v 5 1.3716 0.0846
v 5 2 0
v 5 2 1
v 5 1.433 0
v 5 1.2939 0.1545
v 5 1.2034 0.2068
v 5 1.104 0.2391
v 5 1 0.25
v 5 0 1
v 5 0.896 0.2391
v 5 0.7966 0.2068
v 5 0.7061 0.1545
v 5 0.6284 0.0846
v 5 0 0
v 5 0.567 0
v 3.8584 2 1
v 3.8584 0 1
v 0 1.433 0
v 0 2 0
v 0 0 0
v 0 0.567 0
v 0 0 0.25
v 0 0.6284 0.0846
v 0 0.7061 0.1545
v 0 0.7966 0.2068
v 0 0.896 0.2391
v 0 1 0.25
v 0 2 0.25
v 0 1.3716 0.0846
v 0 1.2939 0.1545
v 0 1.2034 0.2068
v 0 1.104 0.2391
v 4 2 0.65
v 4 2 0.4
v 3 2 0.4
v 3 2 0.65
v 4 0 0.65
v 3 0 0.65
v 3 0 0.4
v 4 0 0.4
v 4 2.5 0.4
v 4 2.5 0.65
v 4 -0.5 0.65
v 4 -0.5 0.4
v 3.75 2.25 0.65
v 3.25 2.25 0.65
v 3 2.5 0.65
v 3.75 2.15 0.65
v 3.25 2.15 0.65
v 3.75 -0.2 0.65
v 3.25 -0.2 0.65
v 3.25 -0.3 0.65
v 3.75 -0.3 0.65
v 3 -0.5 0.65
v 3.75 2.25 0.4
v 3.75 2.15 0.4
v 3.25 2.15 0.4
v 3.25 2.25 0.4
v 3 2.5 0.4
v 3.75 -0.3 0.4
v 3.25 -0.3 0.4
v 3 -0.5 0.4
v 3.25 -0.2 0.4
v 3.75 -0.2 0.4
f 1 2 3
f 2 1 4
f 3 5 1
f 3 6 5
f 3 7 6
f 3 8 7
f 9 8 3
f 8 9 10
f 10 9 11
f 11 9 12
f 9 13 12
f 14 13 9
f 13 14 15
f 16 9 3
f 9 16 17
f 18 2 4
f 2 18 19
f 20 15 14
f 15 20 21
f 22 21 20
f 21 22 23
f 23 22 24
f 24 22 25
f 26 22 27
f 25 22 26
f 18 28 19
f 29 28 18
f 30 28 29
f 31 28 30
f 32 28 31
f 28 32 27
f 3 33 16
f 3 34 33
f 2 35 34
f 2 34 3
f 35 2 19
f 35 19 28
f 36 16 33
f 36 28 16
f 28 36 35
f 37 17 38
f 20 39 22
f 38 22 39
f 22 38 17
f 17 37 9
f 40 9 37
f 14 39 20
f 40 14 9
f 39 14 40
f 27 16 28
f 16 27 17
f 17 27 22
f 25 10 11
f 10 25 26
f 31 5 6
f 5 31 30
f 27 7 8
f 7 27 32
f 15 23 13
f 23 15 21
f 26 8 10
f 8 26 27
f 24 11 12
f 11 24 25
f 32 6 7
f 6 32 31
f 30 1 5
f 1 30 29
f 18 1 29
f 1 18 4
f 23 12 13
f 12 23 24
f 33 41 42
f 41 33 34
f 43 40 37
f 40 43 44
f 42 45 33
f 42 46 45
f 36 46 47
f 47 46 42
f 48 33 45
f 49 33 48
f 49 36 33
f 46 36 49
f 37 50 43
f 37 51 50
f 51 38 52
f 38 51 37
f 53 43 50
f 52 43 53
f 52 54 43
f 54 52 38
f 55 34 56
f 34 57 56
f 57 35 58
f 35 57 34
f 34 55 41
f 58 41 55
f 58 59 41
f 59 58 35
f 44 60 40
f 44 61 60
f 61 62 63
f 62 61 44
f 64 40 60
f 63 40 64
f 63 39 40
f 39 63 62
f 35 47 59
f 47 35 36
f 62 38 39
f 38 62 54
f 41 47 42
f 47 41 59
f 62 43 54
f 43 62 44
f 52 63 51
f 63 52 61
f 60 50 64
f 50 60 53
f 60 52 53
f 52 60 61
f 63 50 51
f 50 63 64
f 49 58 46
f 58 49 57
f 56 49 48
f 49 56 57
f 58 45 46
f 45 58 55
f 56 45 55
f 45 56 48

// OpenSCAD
// Trying to be a trekking pole camera mount
// jellsworth Dec 2014
//
// units = inches


union() {
	difference() {
	
		// base block
		cube([ 5, 2, 1 ], false);
	
		// remove wedge
		translate([ 0, 0, 0.25]) {
			rotate([ 0, -11, 0]) {
				cube([ 5, 2, 1 ], false);
			}
		}
	
		// remove pole channel
		translate([ 0, 1, -0.25]) {
			rotate([ 0, 90, 0]) {
				cylinder(h = 6, r1 = 0.5, r2 = 0.5, center = false, $fn=30);
			}
		}
	}

	difference() {
		// add strap supports
		translate( [3, -0.5, 0.4]) {
			cube([ 1, 3, 0.25]);
		}
		
		// cut strap holes
		translate([3.25, -0.2, 0]){
			rotate([90, 0, 0]) {
				cube([0.5, 2, 0.1], false);
			}
		}
		translate([3.25, 2.25, 0]){
			rotate([90, 0, 0]) {
				cube([0.5, 2, 0.1], false);
			}
		}

		//cut hole for bolt
		//1/4" - 20 x 3/4" (w/ 7/16" head)
		translate([4.5, 1, 0]){
			cylinder(h = 0.75, d=7/16, $fn=6);
			cylinder(h = 1.5, d=1/4, $fn=30);
		}

	}

}
